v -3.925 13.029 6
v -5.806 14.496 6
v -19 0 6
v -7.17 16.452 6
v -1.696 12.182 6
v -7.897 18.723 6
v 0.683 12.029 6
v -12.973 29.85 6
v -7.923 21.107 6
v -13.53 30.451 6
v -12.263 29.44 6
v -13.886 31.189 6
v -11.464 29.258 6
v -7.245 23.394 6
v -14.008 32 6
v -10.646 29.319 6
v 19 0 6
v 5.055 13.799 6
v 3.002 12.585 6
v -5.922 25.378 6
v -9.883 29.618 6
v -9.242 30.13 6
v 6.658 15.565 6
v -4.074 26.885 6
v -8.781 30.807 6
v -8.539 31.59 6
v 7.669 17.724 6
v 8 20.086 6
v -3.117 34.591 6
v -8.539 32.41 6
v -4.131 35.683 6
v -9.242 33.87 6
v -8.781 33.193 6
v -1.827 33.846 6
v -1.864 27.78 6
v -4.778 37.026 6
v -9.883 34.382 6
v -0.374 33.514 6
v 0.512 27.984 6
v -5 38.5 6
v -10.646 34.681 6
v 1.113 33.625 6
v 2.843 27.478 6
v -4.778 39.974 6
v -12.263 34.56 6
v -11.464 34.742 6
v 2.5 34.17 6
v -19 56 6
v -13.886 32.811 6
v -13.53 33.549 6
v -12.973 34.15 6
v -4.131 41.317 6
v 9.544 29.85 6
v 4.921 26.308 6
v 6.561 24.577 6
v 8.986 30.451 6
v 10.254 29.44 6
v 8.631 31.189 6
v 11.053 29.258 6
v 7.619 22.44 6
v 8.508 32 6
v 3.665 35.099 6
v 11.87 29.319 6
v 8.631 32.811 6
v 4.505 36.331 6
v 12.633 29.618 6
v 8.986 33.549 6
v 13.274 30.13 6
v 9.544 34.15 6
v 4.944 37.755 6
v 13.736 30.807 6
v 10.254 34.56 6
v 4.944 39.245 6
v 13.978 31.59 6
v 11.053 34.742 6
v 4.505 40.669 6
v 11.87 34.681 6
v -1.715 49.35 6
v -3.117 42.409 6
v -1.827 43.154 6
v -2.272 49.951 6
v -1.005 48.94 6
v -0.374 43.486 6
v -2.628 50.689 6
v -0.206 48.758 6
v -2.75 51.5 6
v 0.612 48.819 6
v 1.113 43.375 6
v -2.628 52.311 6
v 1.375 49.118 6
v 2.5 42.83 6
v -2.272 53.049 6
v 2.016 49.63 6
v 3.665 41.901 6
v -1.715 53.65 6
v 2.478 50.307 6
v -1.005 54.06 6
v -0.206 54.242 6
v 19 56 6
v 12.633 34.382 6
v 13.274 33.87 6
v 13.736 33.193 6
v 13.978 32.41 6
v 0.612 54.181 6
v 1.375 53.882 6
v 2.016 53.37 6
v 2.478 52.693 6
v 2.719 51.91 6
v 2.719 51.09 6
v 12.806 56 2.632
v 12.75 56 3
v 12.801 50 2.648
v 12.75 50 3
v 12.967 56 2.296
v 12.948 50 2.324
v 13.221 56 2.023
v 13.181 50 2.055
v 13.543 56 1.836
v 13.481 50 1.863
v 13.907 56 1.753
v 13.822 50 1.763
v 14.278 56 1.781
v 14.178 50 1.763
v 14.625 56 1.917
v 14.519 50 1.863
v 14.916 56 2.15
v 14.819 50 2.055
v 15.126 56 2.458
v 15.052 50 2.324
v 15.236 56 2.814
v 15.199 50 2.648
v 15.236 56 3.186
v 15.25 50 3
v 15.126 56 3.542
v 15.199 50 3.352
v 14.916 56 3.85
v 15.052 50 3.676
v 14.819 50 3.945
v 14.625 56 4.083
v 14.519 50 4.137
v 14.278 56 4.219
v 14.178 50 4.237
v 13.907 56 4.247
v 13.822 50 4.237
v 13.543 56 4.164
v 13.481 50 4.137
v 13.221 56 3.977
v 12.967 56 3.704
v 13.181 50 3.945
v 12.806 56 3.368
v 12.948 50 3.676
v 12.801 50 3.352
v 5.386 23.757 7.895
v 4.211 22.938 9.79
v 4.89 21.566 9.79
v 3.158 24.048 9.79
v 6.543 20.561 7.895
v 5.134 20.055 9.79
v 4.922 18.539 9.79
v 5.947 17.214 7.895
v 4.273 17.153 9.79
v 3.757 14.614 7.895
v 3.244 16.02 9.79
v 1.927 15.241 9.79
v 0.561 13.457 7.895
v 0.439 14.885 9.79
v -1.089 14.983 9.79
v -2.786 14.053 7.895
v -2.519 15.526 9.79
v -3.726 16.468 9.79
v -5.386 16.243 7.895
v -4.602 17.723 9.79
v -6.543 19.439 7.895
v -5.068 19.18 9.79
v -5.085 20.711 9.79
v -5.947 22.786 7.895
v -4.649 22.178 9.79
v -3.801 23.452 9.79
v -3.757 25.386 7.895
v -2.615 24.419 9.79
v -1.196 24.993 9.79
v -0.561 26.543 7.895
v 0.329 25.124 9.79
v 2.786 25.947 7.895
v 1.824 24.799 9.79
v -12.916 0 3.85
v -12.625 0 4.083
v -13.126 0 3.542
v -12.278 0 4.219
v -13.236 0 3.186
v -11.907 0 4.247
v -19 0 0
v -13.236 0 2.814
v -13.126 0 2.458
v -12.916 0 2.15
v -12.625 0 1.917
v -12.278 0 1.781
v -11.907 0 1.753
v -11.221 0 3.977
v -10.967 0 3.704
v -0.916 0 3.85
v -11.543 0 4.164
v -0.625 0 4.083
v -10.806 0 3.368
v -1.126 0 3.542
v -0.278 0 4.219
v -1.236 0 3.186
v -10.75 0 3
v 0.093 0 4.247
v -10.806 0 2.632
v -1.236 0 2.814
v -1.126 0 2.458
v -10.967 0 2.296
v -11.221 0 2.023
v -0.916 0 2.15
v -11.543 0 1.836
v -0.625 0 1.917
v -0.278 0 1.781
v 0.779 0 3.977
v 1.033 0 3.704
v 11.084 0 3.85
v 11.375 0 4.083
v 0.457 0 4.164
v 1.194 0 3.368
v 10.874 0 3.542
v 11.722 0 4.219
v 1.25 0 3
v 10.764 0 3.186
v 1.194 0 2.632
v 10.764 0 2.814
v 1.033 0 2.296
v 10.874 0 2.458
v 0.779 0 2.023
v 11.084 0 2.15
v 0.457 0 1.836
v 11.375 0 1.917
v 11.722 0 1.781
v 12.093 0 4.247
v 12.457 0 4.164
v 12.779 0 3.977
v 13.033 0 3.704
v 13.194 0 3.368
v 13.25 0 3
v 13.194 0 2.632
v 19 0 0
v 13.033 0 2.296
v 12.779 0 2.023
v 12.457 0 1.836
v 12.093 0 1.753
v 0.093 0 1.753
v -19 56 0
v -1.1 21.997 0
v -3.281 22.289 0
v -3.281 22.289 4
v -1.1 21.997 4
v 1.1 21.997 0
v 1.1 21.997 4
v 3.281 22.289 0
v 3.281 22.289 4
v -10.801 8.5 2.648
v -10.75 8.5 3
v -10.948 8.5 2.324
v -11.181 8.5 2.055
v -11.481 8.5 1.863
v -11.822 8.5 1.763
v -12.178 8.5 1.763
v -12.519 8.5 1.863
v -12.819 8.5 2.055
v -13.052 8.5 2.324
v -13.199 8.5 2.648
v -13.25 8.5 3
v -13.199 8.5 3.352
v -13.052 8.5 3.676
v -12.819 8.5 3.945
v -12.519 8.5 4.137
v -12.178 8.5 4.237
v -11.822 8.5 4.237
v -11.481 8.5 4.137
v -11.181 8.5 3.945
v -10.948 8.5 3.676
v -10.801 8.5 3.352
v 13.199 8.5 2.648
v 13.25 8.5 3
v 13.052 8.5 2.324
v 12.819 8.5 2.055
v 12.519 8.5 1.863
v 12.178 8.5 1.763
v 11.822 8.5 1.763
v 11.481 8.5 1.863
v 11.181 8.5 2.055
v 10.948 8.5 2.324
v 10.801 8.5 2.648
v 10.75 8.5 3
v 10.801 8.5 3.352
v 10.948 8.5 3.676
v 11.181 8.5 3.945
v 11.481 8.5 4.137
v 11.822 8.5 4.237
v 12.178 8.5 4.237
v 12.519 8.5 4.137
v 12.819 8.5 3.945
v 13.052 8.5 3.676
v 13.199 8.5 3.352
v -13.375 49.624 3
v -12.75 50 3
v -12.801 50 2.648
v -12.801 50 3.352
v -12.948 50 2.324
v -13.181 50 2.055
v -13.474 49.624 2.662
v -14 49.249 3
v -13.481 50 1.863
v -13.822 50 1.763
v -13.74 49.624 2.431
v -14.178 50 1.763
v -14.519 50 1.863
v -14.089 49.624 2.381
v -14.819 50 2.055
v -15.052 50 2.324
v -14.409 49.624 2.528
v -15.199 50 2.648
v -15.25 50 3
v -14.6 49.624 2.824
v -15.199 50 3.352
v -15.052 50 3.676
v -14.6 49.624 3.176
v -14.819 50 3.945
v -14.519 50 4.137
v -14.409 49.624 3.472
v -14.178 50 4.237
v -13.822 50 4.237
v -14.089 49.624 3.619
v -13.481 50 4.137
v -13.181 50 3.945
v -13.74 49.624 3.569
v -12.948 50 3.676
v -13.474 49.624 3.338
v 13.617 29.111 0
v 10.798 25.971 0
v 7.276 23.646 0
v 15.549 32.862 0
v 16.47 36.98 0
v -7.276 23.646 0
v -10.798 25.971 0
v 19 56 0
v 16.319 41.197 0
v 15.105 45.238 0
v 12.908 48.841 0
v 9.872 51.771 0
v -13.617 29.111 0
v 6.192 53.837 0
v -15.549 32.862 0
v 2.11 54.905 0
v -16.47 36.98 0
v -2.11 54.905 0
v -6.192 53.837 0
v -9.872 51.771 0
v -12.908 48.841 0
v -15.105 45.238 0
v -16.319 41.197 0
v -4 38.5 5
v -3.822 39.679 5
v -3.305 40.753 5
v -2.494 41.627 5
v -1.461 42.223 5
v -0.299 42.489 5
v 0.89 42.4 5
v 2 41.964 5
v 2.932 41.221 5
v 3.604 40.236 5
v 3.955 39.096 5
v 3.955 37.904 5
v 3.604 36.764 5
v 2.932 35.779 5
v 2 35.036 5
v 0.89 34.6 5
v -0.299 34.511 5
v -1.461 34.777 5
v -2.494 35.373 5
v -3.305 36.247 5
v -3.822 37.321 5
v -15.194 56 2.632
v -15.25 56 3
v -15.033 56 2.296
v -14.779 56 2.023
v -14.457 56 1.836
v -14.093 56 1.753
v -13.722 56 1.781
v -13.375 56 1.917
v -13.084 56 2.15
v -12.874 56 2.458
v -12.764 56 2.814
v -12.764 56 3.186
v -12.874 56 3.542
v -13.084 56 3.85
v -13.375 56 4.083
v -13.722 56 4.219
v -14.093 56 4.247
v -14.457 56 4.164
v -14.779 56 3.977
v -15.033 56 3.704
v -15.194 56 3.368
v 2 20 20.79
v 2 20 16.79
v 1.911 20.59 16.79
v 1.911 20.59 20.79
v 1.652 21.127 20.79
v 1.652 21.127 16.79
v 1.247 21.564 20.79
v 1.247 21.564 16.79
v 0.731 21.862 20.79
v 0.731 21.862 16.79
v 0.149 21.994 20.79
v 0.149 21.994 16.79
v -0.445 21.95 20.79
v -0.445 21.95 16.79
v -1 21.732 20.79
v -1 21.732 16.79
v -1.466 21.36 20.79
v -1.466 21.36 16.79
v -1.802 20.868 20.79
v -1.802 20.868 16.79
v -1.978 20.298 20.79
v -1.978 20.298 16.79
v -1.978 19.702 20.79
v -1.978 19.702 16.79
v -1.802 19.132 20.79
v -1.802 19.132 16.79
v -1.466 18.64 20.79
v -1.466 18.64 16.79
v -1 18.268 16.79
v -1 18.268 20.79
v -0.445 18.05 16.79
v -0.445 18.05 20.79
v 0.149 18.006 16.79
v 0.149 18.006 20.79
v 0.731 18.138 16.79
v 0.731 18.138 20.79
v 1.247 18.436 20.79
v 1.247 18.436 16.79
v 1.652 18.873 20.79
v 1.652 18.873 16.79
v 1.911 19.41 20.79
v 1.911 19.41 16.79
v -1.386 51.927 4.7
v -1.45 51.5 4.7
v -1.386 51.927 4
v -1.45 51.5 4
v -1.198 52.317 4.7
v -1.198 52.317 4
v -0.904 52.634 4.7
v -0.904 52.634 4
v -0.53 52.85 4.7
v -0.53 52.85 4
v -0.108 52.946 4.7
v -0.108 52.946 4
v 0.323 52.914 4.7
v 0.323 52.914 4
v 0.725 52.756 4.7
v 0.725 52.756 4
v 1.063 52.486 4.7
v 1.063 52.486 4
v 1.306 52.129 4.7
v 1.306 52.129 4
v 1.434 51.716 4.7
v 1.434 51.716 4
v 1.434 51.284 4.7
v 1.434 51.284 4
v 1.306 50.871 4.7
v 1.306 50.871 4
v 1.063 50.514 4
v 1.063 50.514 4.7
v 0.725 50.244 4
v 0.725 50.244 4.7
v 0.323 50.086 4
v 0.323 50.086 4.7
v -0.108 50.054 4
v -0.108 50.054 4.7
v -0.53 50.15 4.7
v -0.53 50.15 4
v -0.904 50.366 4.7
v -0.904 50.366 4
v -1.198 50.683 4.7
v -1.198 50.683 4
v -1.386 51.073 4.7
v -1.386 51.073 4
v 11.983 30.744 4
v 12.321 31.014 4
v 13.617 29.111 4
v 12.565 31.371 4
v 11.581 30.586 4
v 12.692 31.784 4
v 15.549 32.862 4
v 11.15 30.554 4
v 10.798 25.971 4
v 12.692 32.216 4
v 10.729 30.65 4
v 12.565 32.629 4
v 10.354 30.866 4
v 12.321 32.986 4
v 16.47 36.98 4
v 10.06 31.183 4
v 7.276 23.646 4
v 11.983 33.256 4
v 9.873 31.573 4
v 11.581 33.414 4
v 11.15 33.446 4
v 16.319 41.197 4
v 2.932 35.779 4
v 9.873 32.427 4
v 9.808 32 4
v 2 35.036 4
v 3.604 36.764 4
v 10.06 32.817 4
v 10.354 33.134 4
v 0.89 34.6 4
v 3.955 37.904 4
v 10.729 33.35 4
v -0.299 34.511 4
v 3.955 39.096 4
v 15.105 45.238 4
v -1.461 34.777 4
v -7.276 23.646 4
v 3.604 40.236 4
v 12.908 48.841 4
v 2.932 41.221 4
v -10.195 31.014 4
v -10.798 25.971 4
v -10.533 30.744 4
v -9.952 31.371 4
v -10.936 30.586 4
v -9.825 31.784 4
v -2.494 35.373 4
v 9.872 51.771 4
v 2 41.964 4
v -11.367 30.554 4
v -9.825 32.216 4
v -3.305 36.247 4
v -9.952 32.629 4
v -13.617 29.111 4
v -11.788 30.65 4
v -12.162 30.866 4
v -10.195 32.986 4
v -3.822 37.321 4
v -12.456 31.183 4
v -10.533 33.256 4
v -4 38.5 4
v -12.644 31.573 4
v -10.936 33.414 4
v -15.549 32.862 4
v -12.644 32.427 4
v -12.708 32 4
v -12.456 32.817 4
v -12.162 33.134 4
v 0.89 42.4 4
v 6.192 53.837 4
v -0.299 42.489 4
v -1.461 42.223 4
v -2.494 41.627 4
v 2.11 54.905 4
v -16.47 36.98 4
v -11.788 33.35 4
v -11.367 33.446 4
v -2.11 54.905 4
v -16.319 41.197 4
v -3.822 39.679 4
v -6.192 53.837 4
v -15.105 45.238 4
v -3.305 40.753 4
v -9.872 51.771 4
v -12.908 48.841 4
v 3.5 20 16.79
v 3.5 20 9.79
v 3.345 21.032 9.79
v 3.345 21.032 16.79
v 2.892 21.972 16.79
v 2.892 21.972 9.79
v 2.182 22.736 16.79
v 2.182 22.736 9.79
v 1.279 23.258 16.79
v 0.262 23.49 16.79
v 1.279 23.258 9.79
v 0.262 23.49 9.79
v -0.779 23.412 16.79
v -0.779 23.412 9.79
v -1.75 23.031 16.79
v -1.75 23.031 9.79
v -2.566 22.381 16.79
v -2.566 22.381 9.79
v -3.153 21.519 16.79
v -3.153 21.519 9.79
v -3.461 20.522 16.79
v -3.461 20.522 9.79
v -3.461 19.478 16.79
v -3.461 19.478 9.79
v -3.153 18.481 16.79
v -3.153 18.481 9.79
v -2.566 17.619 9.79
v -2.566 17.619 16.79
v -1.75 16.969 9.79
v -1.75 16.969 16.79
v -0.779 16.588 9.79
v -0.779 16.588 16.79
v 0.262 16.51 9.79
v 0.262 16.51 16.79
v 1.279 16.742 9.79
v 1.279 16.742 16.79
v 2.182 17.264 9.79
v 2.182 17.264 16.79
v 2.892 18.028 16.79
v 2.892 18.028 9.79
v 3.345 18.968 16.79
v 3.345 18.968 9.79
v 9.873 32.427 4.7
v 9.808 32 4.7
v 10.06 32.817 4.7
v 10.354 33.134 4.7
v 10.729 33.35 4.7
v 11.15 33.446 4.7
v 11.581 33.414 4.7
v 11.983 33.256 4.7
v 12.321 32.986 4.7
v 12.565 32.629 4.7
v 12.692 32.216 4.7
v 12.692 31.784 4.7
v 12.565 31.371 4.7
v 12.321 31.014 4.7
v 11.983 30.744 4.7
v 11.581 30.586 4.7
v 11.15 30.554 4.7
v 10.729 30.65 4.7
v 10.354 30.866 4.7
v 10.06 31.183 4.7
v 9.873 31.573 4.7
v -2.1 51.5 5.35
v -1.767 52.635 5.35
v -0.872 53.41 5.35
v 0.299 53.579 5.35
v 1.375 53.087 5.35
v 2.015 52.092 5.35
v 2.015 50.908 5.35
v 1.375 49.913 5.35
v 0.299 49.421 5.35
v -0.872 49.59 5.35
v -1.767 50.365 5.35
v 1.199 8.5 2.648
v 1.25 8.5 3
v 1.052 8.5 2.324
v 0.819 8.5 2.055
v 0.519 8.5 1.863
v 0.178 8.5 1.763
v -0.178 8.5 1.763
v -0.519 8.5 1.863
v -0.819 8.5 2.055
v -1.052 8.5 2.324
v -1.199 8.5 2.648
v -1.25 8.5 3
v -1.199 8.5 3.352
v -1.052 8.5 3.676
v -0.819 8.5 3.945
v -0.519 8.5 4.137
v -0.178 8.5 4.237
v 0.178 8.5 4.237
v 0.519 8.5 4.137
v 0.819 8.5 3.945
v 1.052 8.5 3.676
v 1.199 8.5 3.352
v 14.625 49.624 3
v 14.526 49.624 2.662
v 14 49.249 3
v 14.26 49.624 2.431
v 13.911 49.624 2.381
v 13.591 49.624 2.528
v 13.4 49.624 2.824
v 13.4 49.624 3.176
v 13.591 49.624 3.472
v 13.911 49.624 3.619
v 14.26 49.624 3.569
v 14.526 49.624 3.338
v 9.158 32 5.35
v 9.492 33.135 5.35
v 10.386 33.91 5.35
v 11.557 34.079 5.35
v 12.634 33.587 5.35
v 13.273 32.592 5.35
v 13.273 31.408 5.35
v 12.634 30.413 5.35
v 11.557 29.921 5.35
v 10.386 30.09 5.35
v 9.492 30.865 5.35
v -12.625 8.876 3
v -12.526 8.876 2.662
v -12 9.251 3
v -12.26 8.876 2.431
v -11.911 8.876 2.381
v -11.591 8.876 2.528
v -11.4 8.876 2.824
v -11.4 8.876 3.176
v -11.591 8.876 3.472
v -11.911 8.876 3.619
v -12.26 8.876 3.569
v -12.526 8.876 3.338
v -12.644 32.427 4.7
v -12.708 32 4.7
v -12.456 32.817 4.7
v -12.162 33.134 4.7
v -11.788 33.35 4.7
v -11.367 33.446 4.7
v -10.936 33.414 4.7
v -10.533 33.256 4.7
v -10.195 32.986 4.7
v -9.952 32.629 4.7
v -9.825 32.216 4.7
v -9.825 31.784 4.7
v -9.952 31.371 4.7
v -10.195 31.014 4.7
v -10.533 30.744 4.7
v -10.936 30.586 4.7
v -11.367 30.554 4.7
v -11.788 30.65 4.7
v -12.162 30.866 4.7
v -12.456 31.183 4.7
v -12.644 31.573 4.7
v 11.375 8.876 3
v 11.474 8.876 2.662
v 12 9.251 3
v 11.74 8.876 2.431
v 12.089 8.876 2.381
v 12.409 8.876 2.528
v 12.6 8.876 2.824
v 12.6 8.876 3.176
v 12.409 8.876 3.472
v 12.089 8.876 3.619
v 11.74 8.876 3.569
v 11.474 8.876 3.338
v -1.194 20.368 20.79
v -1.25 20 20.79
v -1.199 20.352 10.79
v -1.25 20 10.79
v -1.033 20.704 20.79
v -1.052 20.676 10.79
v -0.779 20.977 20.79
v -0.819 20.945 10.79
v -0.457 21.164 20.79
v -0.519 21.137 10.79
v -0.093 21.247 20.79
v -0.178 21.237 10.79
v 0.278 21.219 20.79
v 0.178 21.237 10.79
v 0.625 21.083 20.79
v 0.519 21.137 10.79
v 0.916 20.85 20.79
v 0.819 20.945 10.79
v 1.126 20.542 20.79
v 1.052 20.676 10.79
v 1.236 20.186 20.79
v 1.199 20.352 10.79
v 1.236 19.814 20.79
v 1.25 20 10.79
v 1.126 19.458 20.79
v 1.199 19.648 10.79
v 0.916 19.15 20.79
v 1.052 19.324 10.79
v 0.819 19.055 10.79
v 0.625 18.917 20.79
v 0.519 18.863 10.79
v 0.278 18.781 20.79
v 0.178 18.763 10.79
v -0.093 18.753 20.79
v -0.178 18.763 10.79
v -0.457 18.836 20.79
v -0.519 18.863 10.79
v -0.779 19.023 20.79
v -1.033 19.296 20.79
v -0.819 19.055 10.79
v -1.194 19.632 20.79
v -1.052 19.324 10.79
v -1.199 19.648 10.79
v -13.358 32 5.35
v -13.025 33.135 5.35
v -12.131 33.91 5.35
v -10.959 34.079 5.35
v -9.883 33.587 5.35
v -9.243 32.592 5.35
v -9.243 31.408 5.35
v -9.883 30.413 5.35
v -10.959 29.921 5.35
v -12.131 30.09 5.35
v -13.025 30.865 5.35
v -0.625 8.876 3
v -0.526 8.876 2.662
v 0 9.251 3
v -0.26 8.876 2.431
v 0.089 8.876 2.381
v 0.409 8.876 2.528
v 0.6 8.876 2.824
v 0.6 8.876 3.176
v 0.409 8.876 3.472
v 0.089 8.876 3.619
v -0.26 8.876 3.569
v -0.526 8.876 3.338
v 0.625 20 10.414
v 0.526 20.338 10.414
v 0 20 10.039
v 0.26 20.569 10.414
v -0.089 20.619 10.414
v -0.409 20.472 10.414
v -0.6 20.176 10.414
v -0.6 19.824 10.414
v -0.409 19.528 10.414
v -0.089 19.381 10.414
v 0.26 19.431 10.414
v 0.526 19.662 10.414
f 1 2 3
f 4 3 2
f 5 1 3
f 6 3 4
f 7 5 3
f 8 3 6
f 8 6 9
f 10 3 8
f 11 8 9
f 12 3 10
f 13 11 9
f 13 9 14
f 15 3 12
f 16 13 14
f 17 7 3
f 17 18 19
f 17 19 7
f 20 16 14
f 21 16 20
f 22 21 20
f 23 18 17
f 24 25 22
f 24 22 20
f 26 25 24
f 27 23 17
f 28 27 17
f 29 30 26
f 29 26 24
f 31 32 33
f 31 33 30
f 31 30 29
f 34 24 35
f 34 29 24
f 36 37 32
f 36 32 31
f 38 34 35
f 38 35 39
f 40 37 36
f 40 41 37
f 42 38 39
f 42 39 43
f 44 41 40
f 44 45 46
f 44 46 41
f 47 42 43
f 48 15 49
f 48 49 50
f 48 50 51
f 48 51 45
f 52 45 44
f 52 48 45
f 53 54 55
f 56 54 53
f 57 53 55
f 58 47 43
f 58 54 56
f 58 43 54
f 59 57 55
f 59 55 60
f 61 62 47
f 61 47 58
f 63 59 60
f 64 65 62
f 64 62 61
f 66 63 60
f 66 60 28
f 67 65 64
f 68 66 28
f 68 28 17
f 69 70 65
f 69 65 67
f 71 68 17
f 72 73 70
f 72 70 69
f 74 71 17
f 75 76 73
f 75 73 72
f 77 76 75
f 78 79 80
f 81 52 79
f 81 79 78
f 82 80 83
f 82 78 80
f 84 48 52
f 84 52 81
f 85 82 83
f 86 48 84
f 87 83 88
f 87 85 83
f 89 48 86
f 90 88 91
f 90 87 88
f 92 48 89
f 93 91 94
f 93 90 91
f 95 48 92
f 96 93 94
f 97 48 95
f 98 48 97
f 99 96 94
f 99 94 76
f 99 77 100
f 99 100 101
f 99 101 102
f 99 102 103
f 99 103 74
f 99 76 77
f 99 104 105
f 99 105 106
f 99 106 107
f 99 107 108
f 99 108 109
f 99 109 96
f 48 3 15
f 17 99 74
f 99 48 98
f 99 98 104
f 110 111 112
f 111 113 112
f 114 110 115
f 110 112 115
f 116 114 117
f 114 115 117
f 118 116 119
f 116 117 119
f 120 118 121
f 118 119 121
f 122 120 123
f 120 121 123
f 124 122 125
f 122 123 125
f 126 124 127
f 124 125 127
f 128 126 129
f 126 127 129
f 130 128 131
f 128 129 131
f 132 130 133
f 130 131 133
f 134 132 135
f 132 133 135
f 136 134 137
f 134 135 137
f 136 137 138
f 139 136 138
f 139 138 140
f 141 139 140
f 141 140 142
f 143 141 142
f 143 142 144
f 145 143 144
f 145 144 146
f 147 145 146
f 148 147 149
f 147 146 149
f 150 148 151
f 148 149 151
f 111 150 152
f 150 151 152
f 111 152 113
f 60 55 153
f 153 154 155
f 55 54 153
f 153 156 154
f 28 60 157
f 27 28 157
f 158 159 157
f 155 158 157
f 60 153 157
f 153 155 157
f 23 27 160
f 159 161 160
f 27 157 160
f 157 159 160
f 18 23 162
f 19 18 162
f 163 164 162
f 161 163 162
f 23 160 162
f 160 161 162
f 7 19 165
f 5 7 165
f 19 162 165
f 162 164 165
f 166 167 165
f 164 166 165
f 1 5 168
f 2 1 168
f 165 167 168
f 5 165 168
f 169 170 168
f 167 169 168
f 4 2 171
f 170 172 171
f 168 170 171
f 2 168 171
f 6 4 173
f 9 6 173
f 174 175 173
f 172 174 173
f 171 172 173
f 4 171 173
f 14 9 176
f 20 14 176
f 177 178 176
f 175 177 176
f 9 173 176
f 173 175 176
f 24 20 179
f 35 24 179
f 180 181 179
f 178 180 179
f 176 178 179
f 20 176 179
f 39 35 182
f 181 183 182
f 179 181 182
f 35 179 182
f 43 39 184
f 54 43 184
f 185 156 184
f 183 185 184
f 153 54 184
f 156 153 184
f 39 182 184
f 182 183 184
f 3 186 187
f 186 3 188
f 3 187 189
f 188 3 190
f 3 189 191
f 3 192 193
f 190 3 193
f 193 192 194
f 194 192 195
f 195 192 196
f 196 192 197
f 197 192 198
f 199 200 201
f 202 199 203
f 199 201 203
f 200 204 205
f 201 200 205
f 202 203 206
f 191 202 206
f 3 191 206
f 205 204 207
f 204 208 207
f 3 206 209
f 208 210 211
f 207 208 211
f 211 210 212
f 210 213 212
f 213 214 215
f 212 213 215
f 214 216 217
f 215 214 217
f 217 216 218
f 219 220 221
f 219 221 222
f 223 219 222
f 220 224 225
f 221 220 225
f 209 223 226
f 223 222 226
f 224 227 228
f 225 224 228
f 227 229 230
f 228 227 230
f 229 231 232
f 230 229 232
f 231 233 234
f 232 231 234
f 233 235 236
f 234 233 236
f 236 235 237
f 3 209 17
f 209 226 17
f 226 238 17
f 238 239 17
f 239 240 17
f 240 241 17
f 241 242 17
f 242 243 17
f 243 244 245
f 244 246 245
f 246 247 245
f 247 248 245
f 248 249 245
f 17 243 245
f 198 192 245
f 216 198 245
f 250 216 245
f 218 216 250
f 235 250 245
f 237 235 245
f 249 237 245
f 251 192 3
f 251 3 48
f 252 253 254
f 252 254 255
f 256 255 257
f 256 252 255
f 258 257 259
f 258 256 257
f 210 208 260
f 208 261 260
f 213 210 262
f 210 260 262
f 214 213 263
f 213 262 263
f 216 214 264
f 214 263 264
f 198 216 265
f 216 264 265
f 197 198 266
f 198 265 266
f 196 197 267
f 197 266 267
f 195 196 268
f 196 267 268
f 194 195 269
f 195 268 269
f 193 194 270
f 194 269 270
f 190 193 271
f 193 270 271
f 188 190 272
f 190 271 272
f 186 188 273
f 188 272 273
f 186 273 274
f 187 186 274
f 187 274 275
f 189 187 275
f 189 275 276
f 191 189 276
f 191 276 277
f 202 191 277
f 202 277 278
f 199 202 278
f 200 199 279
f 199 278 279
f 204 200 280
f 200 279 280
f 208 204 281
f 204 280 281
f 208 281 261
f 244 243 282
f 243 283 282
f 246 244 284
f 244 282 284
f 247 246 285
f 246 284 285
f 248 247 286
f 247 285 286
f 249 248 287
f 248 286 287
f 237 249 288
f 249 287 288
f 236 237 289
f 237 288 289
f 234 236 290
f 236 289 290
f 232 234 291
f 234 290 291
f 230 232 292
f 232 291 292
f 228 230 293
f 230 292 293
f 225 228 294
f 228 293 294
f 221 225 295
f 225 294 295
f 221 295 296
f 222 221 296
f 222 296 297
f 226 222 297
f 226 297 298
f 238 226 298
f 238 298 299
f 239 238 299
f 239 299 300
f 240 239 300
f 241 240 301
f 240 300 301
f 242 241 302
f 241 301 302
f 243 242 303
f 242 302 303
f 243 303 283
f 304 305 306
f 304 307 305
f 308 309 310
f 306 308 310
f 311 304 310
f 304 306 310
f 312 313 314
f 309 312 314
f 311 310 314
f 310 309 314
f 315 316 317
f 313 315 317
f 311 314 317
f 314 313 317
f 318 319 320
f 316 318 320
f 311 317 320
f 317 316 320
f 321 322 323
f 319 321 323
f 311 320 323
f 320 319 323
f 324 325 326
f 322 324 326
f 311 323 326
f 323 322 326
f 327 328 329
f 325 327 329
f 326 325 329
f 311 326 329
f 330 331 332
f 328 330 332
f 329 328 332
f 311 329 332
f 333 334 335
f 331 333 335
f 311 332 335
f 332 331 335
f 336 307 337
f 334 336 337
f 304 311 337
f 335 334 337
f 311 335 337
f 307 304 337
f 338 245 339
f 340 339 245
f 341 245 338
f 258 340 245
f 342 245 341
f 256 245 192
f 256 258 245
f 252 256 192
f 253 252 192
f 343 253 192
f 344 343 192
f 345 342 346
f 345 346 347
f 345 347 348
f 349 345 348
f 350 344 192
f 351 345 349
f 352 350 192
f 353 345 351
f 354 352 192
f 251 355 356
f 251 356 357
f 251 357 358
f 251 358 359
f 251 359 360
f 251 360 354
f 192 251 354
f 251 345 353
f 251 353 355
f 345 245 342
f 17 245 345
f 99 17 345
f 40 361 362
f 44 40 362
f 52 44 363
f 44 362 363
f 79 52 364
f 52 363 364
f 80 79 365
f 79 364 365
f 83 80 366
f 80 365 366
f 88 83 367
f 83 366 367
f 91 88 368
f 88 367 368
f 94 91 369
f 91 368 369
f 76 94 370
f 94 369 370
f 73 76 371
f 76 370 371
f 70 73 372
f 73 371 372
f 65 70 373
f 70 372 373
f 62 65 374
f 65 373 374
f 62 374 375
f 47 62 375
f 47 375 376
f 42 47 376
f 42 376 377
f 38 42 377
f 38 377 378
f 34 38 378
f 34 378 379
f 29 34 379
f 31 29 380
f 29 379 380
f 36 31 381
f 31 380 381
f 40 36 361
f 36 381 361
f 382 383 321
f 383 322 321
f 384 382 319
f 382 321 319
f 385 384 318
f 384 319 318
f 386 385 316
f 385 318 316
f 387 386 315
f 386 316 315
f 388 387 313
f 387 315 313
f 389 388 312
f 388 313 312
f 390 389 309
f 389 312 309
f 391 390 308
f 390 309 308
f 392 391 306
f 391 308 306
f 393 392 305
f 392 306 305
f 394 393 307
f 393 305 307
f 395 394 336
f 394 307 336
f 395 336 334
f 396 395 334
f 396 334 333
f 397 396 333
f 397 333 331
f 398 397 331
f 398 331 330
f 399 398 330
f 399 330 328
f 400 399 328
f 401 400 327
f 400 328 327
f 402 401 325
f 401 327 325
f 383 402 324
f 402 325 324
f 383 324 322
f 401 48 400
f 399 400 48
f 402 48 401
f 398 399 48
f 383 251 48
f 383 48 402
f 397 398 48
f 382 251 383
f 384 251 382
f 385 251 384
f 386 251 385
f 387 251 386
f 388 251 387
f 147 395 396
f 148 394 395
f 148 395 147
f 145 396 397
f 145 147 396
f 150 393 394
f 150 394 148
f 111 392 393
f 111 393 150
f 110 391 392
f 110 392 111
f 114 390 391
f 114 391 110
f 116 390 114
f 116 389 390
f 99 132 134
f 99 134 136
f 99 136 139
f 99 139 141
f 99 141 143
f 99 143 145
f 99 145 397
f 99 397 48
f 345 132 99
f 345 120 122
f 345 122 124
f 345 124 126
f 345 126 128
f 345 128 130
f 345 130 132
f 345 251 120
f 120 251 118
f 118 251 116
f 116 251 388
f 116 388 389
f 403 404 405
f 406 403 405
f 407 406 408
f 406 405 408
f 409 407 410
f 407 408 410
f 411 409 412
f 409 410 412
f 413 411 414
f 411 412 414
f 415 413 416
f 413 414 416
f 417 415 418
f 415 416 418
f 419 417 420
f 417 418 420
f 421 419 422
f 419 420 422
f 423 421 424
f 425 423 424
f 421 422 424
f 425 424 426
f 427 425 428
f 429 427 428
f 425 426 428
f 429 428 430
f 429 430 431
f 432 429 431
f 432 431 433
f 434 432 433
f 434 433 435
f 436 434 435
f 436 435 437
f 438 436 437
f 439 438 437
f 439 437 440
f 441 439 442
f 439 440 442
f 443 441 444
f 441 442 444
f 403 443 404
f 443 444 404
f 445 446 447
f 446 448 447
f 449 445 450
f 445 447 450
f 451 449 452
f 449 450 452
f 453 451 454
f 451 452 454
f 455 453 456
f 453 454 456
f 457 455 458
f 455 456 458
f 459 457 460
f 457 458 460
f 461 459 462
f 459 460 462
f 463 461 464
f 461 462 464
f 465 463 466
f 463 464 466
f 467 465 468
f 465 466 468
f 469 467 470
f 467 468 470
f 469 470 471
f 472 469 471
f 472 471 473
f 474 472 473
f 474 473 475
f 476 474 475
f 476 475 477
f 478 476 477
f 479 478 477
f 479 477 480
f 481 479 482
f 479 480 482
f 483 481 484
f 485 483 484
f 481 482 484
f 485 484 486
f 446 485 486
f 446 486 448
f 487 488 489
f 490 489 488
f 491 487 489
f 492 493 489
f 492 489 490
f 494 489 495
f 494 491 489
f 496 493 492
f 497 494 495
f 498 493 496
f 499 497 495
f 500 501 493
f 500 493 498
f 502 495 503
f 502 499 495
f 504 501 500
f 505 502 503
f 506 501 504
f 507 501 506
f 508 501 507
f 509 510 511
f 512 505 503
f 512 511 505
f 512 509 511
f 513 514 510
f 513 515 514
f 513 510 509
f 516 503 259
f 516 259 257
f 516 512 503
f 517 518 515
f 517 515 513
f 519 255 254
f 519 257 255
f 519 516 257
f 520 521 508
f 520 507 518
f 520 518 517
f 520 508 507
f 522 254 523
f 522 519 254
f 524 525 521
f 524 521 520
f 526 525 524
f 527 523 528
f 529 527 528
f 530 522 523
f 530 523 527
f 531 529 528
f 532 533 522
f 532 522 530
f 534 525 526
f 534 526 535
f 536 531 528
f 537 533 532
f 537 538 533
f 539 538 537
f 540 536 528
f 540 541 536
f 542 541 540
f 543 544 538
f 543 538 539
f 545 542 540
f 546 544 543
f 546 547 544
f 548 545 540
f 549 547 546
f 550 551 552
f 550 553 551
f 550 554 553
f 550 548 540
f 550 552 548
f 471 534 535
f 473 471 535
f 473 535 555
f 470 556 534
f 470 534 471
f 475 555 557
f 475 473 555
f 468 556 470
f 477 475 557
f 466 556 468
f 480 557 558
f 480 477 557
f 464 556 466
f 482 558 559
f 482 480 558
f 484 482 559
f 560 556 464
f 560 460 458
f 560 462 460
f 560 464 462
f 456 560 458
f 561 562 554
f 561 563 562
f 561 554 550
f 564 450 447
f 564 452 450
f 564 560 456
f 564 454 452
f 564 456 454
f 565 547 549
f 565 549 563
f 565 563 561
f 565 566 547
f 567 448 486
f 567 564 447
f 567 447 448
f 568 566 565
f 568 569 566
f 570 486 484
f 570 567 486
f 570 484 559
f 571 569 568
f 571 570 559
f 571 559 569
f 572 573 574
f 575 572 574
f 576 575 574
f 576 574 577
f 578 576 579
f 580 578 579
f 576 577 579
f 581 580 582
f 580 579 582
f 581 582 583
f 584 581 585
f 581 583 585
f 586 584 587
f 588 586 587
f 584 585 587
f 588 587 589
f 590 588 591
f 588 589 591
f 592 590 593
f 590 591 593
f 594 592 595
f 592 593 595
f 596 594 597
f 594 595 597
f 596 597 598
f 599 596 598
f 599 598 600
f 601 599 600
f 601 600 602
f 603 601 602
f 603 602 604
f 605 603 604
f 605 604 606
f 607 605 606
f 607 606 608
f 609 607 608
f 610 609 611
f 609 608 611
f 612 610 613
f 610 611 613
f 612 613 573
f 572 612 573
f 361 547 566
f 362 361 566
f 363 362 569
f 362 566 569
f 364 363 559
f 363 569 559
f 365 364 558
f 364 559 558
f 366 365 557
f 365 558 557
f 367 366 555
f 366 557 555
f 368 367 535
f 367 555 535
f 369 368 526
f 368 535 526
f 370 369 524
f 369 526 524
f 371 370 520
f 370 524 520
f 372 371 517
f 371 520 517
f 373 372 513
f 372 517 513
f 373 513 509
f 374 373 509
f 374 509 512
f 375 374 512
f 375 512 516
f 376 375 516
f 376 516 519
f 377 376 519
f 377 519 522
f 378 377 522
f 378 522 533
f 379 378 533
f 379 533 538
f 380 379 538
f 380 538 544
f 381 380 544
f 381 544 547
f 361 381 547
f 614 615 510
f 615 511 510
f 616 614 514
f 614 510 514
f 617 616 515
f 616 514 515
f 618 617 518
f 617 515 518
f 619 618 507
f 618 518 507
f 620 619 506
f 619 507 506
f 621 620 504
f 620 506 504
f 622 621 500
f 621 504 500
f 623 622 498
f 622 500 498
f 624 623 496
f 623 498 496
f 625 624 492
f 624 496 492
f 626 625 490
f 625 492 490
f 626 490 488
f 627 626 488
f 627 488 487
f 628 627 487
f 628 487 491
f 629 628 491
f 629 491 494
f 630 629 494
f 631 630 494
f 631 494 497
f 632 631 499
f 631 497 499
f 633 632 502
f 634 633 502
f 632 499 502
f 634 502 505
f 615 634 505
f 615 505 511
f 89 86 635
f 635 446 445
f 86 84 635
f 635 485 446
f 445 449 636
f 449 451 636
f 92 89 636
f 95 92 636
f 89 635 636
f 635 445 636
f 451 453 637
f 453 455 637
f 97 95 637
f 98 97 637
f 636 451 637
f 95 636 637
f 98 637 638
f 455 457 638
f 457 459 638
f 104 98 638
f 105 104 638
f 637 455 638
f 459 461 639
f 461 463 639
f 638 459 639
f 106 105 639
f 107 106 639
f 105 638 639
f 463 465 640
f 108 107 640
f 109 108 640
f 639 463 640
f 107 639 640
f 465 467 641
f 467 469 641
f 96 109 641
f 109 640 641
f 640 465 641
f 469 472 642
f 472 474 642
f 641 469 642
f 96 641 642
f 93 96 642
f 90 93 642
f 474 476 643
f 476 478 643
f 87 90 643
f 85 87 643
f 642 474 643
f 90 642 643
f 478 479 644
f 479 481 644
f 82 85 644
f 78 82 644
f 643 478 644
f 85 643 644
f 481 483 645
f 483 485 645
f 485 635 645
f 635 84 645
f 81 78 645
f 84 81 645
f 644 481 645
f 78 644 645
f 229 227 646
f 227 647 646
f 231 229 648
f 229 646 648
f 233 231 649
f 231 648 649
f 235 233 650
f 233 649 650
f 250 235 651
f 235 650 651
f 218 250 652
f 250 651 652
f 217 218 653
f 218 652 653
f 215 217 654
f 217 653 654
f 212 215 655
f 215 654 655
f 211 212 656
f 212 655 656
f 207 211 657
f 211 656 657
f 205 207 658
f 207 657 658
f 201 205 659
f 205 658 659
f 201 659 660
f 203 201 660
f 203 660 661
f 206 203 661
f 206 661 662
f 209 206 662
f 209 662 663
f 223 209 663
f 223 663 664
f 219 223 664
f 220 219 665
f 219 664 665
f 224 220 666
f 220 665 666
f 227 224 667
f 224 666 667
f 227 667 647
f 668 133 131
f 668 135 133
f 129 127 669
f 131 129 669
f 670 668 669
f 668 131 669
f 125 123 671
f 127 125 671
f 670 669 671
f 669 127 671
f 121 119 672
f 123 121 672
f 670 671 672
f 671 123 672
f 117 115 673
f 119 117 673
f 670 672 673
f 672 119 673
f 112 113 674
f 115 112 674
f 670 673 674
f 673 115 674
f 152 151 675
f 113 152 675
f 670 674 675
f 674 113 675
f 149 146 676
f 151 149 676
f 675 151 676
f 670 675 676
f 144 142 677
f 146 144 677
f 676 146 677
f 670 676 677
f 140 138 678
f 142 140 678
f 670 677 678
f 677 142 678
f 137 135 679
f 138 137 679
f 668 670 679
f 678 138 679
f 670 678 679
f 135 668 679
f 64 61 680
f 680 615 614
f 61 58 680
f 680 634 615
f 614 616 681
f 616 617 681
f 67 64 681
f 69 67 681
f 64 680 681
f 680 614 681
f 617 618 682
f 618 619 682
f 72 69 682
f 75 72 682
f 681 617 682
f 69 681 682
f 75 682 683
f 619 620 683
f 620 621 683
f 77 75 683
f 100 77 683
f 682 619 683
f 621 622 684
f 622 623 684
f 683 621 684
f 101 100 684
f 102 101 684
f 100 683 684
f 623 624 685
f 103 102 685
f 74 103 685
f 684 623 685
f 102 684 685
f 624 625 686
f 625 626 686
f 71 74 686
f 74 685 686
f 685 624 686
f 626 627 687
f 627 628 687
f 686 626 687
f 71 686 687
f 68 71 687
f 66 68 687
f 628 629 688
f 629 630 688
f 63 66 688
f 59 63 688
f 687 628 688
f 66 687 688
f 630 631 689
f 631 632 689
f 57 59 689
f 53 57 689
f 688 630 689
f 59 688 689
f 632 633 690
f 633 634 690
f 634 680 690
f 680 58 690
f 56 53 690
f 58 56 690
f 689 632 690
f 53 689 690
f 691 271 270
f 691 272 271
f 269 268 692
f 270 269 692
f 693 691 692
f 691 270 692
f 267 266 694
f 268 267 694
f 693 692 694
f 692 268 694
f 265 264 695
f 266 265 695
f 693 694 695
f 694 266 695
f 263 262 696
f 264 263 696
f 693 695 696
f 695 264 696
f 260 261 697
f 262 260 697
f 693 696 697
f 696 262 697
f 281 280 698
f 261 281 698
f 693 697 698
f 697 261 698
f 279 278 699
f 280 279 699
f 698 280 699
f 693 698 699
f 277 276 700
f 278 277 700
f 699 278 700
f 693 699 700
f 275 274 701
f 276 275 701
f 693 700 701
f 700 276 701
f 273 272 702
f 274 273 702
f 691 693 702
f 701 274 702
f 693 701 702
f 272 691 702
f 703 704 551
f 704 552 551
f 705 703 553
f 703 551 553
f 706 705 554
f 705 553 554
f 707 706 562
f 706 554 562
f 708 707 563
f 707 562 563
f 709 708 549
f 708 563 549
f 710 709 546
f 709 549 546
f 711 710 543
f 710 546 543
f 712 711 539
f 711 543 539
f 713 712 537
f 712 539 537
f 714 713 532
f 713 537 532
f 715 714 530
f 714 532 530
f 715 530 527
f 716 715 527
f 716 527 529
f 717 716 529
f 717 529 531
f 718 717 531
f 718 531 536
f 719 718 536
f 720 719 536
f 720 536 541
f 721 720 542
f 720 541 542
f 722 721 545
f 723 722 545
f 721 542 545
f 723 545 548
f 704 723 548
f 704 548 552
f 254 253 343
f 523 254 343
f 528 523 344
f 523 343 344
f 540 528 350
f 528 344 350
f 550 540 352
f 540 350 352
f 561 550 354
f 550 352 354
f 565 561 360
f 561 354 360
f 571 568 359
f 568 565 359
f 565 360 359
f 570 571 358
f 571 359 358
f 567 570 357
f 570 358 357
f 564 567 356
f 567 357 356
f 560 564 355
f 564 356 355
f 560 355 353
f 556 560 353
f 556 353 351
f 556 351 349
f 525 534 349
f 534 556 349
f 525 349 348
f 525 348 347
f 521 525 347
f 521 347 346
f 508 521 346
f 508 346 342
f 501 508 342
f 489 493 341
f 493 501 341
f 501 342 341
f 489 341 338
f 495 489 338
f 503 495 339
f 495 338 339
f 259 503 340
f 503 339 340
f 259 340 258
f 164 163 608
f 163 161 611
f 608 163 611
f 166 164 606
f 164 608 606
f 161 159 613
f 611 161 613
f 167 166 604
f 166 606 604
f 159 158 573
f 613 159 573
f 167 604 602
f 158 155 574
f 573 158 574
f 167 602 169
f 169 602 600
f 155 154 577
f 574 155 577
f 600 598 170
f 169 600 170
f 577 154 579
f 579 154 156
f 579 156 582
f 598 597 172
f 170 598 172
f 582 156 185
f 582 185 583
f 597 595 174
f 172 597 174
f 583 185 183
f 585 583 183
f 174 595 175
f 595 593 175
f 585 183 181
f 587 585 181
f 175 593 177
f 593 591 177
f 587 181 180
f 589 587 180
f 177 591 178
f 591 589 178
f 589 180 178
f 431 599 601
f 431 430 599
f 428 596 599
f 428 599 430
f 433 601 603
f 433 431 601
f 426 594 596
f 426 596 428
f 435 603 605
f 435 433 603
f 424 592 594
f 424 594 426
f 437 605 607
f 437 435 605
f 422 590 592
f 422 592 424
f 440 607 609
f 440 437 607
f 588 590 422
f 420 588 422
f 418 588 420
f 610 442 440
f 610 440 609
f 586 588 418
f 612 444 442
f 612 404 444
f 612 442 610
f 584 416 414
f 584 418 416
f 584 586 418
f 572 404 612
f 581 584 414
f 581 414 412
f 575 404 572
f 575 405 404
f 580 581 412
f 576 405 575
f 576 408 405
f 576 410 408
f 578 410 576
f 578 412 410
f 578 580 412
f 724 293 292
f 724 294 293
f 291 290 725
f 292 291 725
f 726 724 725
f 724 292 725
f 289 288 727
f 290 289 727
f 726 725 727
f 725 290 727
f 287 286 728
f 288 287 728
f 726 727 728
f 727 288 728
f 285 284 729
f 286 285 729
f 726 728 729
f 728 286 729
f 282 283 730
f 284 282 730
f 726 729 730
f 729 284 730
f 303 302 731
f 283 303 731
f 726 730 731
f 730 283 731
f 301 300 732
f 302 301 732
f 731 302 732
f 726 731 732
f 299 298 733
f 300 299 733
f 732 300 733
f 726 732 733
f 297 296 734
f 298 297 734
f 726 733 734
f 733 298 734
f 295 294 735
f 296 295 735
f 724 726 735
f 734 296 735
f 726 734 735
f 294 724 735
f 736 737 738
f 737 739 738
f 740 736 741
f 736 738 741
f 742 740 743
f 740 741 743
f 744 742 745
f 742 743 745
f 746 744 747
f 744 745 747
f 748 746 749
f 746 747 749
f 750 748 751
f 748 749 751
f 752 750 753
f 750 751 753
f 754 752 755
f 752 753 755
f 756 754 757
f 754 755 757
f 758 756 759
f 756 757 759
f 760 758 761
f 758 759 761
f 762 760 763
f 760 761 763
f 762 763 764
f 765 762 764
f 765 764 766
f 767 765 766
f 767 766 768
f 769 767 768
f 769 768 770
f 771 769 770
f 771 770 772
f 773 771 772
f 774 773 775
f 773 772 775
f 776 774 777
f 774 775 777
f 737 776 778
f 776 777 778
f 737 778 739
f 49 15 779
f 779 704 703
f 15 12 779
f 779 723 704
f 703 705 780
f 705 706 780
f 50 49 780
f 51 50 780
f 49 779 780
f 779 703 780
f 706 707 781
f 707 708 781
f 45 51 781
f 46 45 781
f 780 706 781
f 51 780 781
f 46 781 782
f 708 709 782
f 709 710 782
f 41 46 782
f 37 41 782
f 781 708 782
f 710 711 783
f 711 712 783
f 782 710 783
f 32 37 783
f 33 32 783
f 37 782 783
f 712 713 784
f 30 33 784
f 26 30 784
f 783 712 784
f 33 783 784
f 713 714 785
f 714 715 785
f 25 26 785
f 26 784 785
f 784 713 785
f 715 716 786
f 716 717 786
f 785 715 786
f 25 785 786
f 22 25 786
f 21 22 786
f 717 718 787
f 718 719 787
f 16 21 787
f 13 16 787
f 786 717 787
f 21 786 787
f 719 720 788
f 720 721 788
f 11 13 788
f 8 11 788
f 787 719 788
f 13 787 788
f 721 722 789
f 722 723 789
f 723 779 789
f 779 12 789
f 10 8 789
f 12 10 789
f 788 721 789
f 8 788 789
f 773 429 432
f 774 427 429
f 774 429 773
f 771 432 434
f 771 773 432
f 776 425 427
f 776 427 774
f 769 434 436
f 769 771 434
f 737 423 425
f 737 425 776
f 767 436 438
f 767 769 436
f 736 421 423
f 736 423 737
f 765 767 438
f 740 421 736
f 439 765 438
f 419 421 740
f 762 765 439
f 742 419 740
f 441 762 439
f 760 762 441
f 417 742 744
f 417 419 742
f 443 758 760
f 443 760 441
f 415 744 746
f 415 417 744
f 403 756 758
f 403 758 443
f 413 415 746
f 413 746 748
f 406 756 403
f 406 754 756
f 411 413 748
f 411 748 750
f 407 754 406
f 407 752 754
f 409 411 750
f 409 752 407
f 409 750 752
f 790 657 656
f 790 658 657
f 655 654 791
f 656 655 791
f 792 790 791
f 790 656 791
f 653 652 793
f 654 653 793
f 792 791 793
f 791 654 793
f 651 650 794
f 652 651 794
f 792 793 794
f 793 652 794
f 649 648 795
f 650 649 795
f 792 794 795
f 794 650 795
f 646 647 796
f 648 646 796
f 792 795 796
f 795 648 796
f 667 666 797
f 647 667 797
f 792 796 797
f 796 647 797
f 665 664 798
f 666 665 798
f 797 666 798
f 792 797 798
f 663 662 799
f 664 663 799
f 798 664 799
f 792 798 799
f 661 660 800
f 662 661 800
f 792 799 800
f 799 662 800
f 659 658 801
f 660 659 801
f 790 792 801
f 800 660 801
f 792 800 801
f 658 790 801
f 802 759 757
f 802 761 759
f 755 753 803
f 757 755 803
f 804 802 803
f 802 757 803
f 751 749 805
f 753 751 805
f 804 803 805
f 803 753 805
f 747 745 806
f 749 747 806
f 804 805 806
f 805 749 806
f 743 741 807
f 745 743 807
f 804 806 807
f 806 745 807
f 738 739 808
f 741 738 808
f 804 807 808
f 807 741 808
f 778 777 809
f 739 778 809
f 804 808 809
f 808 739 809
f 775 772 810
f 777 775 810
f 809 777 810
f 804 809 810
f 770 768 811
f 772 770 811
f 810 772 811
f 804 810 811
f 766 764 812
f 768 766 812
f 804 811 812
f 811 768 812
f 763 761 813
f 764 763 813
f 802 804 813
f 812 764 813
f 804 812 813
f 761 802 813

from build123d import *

# Parameters (mm, degrees)
ESBO_O1_W                                            = 38
ESBO_O1_H                                            = 56
ESBO_O1_R                                            = 4
RESSALTO_EXTRUS_O1_DEPTH                             = 6
ESBO_O6_R                                            = 16.54
CORTE_EXTRUS_O5_DEPTH                                = 4
ESBO_O7_R                                            = 4
ESBO_O7_R_2                                          = 1.25
CORTE_EXTRUS_O6_DEPTH                                = 60.270566051
ESCAREADO_PARA_PARAFUSO_DE_M_QUINA_COM_C_D           = 2.9
ESCAREADO_PARA_PARAFUSO_DE_M_QUINA_COM_C_CSINK_D     = 5.5
ESCAREADO_PARA_PARAFUSO_DE_M_QUINA_COM_C_CSINK_ANGLE = 90
RESSALTO_EXTRUS_O2_DEPTH                             = 4
RESSALTO_EXTRUS_O3_DEPTH                             = 5.79
ESBO_O17_R                                           = 3.5
RESSALTO_EXTRUS_O4_DEPTH                             = 7
ESBO_O18_R                                           = 2
RESSALTO_EXTRUS_O5_DEPTH                             = 4
CHANFRO1_SIZE                                        = 4
CHANFRO1_SIZE_2                                      = 5.29
FURO_ROSCADO_DE_M3X0_51_D                            = 2.5
FURO_ROSCADO_DE_M3X0_51_DEPTH                        = 10
FURO_ROSCADO_DE_M3X0_51_TIP                          = 0.751075774
FURO_ROSCADO_DE_M3X0_52_D                            = 2.5
FURO_ROSCADO_DE_M3X0_52_DEPTH                        = 8.5
FURO_ROSCADO_DE_M3X0_52_TIP                          = 0.751075774
FURO_ROSCADO_DE_M3X0_53_D                            = 2.5
FURO_ROSCADO_DE_M3X0_53_DEPTH                        = 6
FURO_ROSCADO_DE_M3X0_53_TIP                          = 0.751075774
CHANFRO2_SIZE                                        = 1


with BuildPart() as part:
    # Esboço1 → Ressalto-extrusão1 (new body)
    with BuildSketch(Plane.XY):
        with Locations((0, 28)):
            Rectangle(ESBO_O1_W, ESBO_O1_H)
        with Locations((0, 20)):
            Circle(ESBO_O1_R, mode=Mode.SUBTRACT)
    extrude(amount=RESSALTO_EXTRUS_O1_DEPTH)

    # Esboço6 → Corte-extrusão5 (cut)
    with BuildSketch(Plane(origin=(0, 0, 0), x_dir=(-1, 0, 0), z_dir=(0, 0, -1))):
        with Locations((0, 38.5)):
            Circle(ESBO_O6_R)
    extrude(amount=-CORTE_EXTRUS_O5_DEPTH, mode=Mode.SUBTRACT)

    # Esboço7 → Corte-extrusão6 (cut, through all)
    with BuildSketch(Plane(origin=(0, 0, 4), x_dir=(-1, 0, 0), z_dir=(0, 0, -1))):
        with Locations((0, 38.5)):
            Circle(ESBO_O7_R)
        with Locations((11.258330249, 32)):
            Circle(ESBO_O7_R_2)
        with Locations((-11.258330249, 32)):
            Circle(ESBO_O7_R_2)
        with Locations((0, 51.5)):
            Circle(ESBO_O7_R_2)
    extrude(amount=-CORTE_EXTRUS_O6_DEPTH, mode=Mode.SUBTRACT)

    # Escareado para parafuso de máquina com cabeça chata de M2.51 (through all)
    with Locations(Plane.XY.offset(6)):
        with Locations((0, 51.5), (11.258330249, 32), (-11.258330249, 32)):
            CounterSinkHole(ESCAREADO_PARA_PARAFUSO_DE_M_QUINA_COM_C_D / 2, ESCAREADO_PARA_PARAFUSO_DE_M_QUINA_COM_C_CSINK_D / 2, counter_sink_angle=ESCAREADO_PARA_PARAFUSO_DE_M_QUINA_COM_C_CSINK_ANGLE)

    # Esboço15 → Ressalto-extrusão2 (add)
    with BuildSketch(Plane(origin=(0, 0, 0), x_dir=(-1, 0, 0), z_dir=(0, 0, -1))):
        with BuildLine():
            ThreePointArc((-3.280592218, 22.288605405), (0, 16), (3.280592218, 22.288605405))
            ThreePointArc((3.280592218, 22.288605405), (0, 21.96), (-3.280592218, 22.288605405))
        make_face()
    extrude(amount=-RESSALTO_EXTRUS_O2_DEPTH)

    # Esboço16 → Ressalto-extrusão3 (add)
    with BuildSketch(Plane.XY.offset(4)):
        with BuildLine():
            ThreePointArc((-3.280592218, 22.288605405), (0, 16), (3.280592218, 22.288605405))
            ThreePointArc((3.280592218, 22.288605405), (0, 24), (-3.280592218, 22.288605405))
        make_face()
    extrude(amount=RESSALTO_EXTRUS_O3_DEPTH)

    # Esboço17 → Ressalto-extrusão4 (add)
    with BuildSketch(Plane.XY.offset(9.79)):
        with Locations((0, 20)):
            Circle(ESBO_O17_R)
    extrude(amount=RESSALTO_EXTRUS_O4_DEPTH)

    # Esboço18 → Ressalto-extrusão5 (add)
    with BuildSketch(Plane.XY.offset(16.79)):
        with Locations((0, 20)):
            Circle(ESBO_O18_R)
    extrude(amount=RESSALTO_EXTRUS_O5_DEPTH)

    # Chanfro1
    # the kernel refuses this chamfer: 5.29, 4 mm, written as the material it adds along each edge
    with BuildSketch(Plane(origin=(0, 20, 6), x_dir=(0.8201480544065356, 0.5721513513513485, 0), z_dir=(-0.5721513513513485, 0.8201480544065356, 0))) as chanfro1_piece_1_section:
        Polygon((4 + CHANFRO1_SIZE, 0), (4, -CHANFRO1_SIZE_2), (4, 0), align=None)
    chanfro1_piece_1 = revolve(axis=Axis((0, 20, 6), (0, 0, -1)), mode=Mode.PRIVATE)
    chanfro1_piece_1 = split(chanfro1_piece_1, bisect_by=Plane(origin=(-5.391672126, 16.23866389, 9.79), z_dir=(0, 0, -1)), keep=Keep.TOP, mode=Mode.PRIVATE)
    add(chanfro1_piece_1)

    # Furo roscado de M3x0.51
    with Locations(Plane.XY.offset(20.79)):
        with Locations((0, 20)):
            Hole(FURO_ROSCADO_DE_M3X0_51_D / 2, depth=FURO_ROSCADO_DE_M3X0_51_DEPTH)
            with Locations((0, 0, -(FURO_ROSCADO_DE_M3X0_51_DEPTH + FURO_ROSCADO_DE_M3X0_51_TIP / 2))):  # 118° drill point
                Cone(0, FURO_ROSCADO_DE_M3X0_51_D / 2, FURO_ROSCADO_DE_M3X0_51_TIP, mode=Mode.SUBTRACT)

    # Furo roscado de M3x0.52
    with Locations(Plane(origin=(0, 0, 0), x_dir=(-1, 0, 0), z_dir=(0, -1, 0))):
        with Locations((12, -3), (0, -3), (-12, -3)):
            Hole(FURO_ROSCADO_DE_M3X0_52_D / 2, depth=FURO_ROSCADO_DE_M3X0_52_DEPTH)
            with Locations((0, 0, -(FURO_ROSCADO_DE_M3X0_52_DEPTH + FURO_ROSCADO_DE_M3X0_52_TIP / 2))):  # 118° drill point
                Cone(0, FURO_ROSCADO_DE_M3X0_52_D / 2, FURO_ROSCADO_DE_M3X0_52_TIP, mode=Mode.SUBTRACT)

    # Furo roscado de M3x0.53
    with Locations(Plane(origin=(0, 56, 0), x_dir=(1, 0, 0), z_dir=(0, 1, 0))):
        with Locations((-14, -3), (14, -3)):
            Hole(FURO_ROSCADO_DE_M3X0_53_D / 2, depth=FURO_ROSCADO_DE_M3X0_53_DEPTH)
            with Locations((0, 0, -(FURO_ROSCADO_DE_M3X0_53_DEPTH + FURO_ROSCADO_DE_M3X0_53_TIP / 2))):  # 118° drill point
                Cone(0, FURO_ROSCADO_DE_M3X0_53_D / 2, FURO_ROSCADO_DE_M3X0_53_TIP, mode=Mode.SUBTRACT)

    # Chanfro2
    chanfro2_edges = [part.edges().sort_by_distance(p)[0] for p in [
        (4, 38.5, 6),
    ]]
    chamfer(chanfro2_edges, length=CHANFRO2_SIZE)


solid = part.part
